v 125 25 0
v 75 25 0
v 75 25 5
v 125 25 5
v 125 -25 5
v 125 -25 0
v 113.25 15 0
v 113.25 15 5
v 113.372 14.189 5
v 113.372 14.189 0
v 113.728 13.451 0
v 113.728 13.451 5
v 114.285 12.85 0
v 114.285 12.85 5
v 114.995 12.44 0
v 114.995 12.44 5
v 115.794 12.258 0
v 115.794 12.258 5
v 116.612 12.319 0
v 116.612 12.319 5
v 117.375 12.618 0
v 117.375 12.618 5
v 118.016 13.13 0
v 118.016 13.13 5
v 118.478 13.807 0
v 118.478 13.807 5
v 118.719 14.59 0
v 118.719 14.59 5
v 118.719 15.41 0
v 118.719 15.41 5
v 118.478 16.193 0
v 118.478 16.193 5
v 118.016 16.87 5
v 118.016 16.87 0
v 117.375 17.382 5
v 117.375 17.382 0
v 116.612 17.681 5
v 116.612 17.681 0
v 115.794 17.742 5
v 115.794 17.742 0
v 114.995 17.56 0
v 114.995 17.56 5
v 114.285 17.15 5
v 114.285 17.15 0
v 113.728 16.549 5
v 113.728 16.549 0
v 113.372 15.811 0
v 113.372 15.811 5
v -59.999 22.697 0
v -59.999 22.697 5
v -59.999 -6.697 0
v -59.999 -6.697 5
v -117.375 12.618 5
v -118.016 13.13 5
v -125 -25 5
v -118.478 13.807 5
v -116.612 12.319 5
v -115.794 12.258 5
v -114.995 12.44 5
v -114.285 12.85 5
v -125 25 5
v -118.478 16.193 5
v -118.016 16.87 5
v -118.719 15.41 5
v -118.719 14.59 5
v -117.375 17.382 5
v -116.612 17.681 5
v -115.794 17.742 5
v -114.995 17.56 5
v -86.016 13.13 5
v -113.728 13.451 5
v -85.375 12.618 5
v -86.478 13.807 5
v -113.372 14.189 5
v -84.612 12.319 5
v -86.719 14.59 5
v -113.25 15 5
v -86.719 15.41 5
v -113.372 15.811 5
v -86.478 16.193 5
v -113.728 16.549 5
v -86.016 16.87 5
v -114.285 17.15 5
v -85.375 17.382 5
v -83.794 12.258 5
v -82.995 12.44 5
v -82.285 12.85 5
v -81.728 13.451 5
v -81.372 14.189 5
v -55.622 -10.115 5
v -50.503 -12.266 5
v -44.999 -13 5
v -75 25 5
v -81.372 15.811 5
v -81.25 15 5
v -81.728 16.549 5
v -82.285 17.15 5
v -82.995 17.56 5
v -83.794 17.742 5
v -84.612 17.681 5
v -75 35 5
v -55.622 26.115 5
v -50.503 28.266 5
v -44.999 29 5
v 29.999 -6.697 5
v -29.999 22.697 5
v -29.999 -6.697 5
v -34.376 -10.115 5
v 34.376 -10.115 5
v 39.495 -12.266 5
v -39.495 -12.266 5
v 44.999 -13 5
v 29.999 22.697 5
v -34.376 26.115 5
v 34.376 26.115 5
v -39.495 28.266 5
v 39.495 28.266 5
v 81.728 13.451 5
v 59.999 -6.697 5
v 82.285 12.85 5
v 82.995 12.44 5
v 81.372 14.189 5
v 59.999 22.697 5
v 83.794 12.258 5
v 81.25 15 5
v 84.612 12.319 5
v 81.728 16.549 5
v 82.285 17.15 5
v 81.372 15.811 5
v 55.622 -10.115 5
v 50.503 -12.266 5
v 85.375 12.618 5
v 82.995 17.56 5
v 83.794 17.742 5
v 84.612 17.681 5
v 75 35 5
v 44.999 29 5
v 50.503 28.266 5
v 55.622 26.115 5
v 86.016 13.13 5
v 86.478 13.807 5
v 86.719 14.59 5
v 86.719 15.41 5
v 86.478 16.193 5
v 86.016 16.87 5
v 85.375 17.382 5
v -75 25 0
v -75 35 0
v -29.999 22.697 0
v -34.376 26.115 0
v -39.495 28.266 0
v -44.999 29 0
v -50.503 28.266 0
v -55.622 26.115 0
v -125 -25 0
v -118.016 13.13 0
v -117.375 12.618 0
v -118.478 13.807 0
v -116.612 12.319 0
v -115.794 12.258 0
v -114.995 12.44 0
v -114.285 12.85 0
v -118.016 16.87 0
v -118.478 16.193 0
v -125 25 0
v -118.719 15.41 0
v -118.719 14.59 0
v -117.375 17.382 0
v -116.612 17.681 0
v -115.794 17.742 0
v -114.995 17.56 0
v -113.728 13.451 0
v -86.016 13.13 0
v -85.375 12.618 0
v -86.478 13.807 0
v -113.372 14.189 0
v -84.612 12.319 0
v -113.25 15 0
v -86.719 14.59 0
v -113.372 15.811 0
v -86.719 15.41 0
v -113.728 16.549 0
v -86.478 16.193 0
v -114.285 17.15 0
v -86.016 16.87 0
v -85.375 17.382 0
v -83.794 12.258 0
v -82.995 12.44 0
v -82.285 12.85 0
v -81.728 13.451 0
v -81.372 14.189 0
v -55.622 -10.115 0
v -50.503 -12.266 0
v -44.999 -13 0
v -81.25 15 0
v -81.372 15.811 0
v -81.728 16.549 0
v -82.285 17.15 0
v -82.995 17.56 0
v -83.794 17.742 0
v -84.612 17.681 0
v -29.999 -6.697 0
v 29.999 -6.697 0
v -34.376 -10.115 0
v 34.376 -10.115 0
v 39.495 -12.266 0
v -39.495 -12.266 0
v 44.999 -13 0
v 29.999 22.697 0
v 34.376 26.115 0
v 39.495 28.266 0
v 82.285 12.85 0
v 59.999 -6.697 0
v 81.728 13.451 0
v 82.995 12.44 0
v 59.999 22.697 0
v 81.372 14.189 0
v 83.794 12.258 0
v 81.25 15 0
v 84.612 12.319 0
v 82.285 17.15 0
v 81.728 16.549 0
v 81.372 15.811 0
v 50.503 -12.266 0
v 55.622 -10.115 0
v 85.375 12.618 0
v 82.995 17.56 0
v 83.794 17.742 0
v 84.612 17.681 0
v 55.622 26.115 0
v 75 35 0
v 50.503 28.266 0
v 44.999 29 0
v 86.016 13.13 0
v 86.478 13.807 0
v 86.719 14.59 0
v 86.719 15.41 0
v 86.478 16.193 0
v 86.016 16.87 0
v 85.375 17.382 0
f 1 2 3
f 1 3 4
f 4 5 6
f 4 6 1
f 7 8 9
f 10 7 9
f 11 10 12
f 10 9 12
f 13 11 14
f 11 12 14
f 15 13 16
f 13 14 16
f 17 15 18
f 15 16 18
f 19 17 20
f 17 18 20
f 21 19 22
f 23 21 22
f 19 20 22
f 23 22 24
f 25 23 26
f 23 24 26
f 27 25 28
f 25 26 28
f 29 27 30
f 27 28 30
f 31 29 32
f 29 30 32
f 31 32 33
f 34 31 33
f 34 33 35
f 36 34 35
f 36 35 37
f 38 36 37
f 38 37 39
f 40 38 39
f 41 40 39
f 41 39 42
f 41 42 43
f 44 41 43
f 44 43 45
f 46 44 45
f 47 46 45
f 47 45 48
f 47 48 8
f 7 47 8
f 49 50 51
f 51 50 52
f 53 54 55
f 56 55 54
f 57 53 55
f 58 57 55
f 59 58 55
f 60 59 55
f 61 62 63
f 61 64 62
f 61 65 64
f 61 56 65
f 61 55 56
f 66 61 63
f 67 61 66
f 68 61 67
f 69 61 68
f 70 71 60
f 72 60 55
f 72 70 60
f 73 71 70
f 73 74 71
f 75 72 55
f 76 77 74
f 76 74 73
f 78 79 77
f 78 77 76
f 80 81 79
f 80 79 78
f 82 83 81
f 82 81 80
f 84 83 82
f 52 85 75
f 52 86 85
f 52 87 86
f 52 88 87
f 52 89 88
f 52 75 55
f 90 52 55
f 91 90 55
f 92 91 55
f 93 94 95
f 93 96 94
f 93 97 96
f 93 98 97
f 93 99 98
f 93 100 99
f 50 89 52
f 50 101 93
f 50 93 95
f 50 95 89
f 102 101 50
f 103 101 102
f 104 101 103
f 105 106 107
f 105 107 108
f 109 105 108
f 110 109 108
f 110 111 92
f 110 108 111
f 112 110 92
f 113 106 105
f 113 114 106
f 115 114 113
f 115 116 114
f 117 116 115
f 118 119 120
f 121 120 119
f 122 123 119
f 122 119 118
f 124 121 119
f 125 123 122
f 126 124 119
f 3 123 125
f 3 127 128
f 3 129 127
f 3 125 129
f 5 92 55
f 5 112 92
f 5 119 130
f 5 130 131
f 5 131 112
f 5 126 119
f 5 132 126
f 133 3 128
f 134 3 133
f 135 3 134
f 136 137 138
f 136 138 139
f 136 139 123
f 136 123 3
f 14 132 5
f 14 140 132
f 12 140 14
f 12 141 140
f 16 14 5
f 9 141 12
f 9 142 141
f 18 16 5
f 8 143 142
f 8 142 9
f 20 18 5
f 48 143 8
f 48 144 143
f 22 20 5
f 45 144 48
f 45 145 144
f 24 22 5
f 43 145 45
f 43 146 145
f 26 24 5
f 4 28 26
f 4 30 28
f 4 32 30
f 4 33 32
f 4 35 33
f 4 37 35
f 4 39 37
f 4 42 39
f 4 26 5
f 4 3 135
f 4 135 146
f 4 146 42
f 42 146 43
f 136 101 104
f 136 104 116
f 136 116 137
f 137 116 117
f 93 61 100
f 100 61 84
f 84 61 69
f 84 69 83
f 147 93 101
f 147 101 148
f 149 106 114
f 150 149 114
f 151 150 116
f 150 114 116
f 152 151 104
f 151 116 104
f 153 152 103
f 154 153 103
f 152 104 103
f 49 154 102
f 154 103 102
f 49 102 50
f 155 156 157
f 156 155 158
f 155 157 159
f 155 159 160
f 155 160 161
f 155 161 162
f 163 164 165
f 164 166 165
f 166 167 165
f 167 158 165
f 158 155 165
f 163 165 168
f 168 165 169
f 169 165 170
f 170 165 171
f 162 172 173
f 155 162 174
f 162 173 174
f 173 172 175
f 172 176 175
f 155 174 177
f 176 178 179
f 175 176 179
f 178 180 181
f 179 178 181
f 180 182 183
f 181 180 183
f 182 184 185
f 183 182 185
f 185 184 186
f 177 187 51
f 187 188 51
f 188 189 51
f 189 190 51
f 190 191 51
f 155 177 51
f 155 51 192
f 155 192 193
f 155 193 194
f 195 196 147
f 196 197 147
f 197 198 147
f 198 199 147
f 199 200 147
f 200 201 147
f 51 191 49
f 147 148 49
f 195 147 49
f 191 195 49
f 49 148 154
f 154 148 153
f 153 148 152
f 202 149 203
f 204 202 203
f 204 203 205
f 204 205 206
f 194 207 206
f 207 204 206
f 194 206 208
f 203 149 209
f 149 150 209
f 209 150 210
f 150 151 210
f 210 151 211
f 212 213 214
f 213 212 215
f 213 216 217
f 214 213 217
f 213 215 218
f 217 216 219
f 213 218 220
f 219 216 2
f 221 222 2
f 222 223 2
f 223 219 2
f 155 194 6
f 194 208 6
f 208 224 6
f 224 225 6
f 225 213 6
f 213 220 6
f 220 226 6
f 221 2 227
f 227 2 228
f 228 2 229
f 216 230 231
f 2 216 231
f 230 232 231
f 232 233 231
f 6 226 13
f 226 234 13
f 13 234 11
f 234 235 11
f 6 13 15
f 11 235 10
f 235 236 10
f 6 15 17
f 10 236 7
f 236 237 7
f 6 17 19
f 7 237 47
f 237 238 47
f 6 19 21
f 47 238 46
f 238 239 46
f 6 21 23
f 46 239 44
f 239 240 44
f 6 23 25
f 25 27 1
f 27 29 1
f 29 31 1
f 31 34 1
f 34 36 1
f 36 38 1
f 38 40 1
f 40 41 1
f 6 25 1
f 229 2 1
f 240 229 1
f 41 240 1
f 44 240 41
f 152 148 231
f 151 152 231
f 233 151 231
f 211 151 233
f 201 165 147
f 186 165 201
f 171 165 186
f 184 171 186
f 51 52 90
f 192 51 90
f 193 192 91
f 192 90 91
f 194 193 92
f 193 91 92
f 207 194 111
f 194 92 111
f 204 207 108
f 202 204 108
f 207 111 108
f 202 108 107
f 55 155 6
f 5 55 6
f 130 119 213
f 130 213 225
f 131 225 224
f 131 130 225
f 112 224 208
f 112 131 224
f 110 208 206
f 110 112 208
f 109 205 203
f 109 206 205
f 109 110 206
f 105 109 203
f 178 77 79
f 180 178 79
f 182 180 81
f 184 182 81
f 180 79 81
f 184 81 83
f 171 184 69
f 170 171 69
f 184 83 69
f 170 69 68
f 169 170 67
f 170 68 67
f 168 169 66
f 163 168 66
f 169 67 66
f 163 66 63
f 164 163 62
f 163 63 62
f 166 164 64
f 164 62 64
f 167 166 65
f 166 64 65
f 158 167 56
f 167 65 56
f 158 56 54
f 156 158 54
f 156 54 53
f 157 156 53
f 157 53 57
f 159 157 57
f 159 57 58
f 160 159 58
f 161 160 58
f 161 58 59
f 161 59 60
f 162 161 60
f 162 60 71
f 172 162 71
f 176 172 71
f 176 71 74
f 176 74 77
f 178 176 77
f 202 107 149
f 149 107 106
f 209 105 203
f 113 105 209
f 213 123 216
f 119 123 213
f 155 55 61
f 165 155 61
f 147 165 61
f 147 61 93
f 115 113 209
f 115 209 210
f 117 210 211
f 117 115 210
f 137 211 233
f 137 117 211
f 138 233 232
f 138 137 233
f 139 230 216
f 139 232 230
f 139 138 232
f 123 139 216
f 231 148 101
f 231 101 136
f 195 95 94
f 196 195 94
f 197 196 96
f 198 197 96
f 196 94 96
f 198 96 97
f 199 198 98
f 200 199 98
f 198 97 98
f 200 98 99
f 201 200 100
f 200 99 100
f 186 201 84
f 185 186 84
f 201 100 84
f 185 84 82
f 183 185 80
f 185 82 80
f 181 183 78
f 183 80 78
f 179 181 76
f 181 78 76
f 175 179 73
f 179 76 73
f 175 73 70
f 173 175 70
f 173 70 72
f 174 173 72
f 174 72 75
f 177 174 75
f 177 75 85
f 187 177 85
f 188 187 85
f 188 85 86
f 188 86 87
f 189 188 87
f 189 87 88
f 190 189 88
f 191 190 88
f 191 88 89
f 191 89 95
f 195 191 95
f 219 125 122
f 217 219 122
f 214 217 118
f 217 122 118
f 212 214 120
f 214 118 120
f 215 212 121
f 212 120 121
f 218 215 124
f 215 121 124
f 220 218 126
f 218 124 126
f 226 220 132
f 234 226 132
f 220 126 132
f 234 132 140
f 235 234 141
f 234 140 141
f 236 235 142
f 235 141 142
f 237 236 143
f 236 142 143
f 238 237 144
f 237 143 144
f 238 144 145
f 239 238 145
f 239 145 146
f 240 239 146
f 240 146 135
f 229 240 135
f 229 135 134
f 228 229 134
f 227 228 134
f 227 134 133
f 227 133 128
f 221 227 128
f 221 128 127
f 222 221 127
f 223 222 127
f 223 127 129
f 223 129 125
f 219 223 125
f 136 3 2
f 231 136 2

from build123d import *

# Parameters (mm, degrees)
SKETCH_1_W          = 290
SKETCH_1_H          = 50
EXTRUDE_1_DEPTH     = 5
SKETCH_3_W          = 20
SKETCH_3_H          = 50
CUT_EXTRUDE_1_DEPTH = 10
SKETCH_4_W          = 150
SKETCH_4_H          = 5
EXTRUDE_2_DEPTH     = 10
SKETCH_5_R          = 2.75
CUT_EXTRUDE_4_DEPTH = 130.903810568
CUT_EXTRUDE_5_DEPTH = 10


with BuildPart() as part:
    # 스케치1 → 보스-돌출1 (new body)
    with BuildSketch(Plane.XY):
        Rectangle(SKETCH_1_W, SKETCH_1_H)
    extrude(amount=EXTRUDE_1_DEPTH)

    # 스케치3 → 컷-돌출1 (cut)
    with BuildSketch(Plane.XY.offset(5)):
        with Locations((-135, 0)):
            Rectangle(SKETCH_3_W, SKETCH_3_H)
    cut_extrude_1 = extrude(amount=-CUT_EXTRUDE_1_DEPTH, mode=Mode.SUBTRACT)

    # 대칭 복사1: 컷-돌출1 across plane
    add(cut_extrude_1.mirror(Plane(origin=(0, 0, 0), x_dir=(0, 0, 1), z_dir=(1, 0, 0))), mode=Mode.SUBTRACT)

    # 스케치4 → 보스-돌출2 (add)
    with BuildSketch(Plane(origin=(0, 25, 0), x_dir=(1, 0, 0), z_dir=(0, 1, 0))):
        with Locations((0, -2.5)):
            Rectangle(SKETCH_4_W, SKETCH_4_H)
    extrude(amount=EXTRUDE_2_DEPTH)

    # 스케치5 → 컷-돌출4 (cut, through all)
    with BuildSketch(Plane.XY.offset(5)):
        with Locations((-84, 15)):
            Circle(SKETCH_5_R)
        with Locations((-116, 15)):
            Circle(SKETCH_5_R)
        with Locations(Location((116, 15, 0), (0, 0, 180))):
            Circle(SKETCH_5_R)
        with Locations(Location((84, 15, 0), (0, 0, 180))):
            Circle(SKETCH_5_R)
    extrude(amount=-CUT_EXTRUDE_4_DEPTH, mode=Mode.SUBTRACT)

    # 스케치6 → 컷-돌출5 (cut)
    with BuildSketch(Plane.XY.offset(5)):
        with BuildLine():
            Line((59.99900565, 22.696938457), (59.99900565, -6.696938457))
            ThreePointArc((59.99900565, -6.696938457), (44.99900565, -13), (29.99900565, -6.696938457))
            Line((29.99900565, -6.696938457), (29.99900565, 22.696938457))
            ThreePointArc((29.99900565, 22.696938457), (44.99900565, 29), (59.99900565, 22.696938457))
        make_face()
    cut_extrude_5 = extrude(amount=-CUT_EXTRUDE_5_DEPTH, mode=Mode.SUBTRACT)

    # 대칭 복사2: 컷-돌출5 across plane
    add(cut_extrude_5.mirror(Plane.ZY), mode=Mode.SUBTRACT)


solid = part.part
